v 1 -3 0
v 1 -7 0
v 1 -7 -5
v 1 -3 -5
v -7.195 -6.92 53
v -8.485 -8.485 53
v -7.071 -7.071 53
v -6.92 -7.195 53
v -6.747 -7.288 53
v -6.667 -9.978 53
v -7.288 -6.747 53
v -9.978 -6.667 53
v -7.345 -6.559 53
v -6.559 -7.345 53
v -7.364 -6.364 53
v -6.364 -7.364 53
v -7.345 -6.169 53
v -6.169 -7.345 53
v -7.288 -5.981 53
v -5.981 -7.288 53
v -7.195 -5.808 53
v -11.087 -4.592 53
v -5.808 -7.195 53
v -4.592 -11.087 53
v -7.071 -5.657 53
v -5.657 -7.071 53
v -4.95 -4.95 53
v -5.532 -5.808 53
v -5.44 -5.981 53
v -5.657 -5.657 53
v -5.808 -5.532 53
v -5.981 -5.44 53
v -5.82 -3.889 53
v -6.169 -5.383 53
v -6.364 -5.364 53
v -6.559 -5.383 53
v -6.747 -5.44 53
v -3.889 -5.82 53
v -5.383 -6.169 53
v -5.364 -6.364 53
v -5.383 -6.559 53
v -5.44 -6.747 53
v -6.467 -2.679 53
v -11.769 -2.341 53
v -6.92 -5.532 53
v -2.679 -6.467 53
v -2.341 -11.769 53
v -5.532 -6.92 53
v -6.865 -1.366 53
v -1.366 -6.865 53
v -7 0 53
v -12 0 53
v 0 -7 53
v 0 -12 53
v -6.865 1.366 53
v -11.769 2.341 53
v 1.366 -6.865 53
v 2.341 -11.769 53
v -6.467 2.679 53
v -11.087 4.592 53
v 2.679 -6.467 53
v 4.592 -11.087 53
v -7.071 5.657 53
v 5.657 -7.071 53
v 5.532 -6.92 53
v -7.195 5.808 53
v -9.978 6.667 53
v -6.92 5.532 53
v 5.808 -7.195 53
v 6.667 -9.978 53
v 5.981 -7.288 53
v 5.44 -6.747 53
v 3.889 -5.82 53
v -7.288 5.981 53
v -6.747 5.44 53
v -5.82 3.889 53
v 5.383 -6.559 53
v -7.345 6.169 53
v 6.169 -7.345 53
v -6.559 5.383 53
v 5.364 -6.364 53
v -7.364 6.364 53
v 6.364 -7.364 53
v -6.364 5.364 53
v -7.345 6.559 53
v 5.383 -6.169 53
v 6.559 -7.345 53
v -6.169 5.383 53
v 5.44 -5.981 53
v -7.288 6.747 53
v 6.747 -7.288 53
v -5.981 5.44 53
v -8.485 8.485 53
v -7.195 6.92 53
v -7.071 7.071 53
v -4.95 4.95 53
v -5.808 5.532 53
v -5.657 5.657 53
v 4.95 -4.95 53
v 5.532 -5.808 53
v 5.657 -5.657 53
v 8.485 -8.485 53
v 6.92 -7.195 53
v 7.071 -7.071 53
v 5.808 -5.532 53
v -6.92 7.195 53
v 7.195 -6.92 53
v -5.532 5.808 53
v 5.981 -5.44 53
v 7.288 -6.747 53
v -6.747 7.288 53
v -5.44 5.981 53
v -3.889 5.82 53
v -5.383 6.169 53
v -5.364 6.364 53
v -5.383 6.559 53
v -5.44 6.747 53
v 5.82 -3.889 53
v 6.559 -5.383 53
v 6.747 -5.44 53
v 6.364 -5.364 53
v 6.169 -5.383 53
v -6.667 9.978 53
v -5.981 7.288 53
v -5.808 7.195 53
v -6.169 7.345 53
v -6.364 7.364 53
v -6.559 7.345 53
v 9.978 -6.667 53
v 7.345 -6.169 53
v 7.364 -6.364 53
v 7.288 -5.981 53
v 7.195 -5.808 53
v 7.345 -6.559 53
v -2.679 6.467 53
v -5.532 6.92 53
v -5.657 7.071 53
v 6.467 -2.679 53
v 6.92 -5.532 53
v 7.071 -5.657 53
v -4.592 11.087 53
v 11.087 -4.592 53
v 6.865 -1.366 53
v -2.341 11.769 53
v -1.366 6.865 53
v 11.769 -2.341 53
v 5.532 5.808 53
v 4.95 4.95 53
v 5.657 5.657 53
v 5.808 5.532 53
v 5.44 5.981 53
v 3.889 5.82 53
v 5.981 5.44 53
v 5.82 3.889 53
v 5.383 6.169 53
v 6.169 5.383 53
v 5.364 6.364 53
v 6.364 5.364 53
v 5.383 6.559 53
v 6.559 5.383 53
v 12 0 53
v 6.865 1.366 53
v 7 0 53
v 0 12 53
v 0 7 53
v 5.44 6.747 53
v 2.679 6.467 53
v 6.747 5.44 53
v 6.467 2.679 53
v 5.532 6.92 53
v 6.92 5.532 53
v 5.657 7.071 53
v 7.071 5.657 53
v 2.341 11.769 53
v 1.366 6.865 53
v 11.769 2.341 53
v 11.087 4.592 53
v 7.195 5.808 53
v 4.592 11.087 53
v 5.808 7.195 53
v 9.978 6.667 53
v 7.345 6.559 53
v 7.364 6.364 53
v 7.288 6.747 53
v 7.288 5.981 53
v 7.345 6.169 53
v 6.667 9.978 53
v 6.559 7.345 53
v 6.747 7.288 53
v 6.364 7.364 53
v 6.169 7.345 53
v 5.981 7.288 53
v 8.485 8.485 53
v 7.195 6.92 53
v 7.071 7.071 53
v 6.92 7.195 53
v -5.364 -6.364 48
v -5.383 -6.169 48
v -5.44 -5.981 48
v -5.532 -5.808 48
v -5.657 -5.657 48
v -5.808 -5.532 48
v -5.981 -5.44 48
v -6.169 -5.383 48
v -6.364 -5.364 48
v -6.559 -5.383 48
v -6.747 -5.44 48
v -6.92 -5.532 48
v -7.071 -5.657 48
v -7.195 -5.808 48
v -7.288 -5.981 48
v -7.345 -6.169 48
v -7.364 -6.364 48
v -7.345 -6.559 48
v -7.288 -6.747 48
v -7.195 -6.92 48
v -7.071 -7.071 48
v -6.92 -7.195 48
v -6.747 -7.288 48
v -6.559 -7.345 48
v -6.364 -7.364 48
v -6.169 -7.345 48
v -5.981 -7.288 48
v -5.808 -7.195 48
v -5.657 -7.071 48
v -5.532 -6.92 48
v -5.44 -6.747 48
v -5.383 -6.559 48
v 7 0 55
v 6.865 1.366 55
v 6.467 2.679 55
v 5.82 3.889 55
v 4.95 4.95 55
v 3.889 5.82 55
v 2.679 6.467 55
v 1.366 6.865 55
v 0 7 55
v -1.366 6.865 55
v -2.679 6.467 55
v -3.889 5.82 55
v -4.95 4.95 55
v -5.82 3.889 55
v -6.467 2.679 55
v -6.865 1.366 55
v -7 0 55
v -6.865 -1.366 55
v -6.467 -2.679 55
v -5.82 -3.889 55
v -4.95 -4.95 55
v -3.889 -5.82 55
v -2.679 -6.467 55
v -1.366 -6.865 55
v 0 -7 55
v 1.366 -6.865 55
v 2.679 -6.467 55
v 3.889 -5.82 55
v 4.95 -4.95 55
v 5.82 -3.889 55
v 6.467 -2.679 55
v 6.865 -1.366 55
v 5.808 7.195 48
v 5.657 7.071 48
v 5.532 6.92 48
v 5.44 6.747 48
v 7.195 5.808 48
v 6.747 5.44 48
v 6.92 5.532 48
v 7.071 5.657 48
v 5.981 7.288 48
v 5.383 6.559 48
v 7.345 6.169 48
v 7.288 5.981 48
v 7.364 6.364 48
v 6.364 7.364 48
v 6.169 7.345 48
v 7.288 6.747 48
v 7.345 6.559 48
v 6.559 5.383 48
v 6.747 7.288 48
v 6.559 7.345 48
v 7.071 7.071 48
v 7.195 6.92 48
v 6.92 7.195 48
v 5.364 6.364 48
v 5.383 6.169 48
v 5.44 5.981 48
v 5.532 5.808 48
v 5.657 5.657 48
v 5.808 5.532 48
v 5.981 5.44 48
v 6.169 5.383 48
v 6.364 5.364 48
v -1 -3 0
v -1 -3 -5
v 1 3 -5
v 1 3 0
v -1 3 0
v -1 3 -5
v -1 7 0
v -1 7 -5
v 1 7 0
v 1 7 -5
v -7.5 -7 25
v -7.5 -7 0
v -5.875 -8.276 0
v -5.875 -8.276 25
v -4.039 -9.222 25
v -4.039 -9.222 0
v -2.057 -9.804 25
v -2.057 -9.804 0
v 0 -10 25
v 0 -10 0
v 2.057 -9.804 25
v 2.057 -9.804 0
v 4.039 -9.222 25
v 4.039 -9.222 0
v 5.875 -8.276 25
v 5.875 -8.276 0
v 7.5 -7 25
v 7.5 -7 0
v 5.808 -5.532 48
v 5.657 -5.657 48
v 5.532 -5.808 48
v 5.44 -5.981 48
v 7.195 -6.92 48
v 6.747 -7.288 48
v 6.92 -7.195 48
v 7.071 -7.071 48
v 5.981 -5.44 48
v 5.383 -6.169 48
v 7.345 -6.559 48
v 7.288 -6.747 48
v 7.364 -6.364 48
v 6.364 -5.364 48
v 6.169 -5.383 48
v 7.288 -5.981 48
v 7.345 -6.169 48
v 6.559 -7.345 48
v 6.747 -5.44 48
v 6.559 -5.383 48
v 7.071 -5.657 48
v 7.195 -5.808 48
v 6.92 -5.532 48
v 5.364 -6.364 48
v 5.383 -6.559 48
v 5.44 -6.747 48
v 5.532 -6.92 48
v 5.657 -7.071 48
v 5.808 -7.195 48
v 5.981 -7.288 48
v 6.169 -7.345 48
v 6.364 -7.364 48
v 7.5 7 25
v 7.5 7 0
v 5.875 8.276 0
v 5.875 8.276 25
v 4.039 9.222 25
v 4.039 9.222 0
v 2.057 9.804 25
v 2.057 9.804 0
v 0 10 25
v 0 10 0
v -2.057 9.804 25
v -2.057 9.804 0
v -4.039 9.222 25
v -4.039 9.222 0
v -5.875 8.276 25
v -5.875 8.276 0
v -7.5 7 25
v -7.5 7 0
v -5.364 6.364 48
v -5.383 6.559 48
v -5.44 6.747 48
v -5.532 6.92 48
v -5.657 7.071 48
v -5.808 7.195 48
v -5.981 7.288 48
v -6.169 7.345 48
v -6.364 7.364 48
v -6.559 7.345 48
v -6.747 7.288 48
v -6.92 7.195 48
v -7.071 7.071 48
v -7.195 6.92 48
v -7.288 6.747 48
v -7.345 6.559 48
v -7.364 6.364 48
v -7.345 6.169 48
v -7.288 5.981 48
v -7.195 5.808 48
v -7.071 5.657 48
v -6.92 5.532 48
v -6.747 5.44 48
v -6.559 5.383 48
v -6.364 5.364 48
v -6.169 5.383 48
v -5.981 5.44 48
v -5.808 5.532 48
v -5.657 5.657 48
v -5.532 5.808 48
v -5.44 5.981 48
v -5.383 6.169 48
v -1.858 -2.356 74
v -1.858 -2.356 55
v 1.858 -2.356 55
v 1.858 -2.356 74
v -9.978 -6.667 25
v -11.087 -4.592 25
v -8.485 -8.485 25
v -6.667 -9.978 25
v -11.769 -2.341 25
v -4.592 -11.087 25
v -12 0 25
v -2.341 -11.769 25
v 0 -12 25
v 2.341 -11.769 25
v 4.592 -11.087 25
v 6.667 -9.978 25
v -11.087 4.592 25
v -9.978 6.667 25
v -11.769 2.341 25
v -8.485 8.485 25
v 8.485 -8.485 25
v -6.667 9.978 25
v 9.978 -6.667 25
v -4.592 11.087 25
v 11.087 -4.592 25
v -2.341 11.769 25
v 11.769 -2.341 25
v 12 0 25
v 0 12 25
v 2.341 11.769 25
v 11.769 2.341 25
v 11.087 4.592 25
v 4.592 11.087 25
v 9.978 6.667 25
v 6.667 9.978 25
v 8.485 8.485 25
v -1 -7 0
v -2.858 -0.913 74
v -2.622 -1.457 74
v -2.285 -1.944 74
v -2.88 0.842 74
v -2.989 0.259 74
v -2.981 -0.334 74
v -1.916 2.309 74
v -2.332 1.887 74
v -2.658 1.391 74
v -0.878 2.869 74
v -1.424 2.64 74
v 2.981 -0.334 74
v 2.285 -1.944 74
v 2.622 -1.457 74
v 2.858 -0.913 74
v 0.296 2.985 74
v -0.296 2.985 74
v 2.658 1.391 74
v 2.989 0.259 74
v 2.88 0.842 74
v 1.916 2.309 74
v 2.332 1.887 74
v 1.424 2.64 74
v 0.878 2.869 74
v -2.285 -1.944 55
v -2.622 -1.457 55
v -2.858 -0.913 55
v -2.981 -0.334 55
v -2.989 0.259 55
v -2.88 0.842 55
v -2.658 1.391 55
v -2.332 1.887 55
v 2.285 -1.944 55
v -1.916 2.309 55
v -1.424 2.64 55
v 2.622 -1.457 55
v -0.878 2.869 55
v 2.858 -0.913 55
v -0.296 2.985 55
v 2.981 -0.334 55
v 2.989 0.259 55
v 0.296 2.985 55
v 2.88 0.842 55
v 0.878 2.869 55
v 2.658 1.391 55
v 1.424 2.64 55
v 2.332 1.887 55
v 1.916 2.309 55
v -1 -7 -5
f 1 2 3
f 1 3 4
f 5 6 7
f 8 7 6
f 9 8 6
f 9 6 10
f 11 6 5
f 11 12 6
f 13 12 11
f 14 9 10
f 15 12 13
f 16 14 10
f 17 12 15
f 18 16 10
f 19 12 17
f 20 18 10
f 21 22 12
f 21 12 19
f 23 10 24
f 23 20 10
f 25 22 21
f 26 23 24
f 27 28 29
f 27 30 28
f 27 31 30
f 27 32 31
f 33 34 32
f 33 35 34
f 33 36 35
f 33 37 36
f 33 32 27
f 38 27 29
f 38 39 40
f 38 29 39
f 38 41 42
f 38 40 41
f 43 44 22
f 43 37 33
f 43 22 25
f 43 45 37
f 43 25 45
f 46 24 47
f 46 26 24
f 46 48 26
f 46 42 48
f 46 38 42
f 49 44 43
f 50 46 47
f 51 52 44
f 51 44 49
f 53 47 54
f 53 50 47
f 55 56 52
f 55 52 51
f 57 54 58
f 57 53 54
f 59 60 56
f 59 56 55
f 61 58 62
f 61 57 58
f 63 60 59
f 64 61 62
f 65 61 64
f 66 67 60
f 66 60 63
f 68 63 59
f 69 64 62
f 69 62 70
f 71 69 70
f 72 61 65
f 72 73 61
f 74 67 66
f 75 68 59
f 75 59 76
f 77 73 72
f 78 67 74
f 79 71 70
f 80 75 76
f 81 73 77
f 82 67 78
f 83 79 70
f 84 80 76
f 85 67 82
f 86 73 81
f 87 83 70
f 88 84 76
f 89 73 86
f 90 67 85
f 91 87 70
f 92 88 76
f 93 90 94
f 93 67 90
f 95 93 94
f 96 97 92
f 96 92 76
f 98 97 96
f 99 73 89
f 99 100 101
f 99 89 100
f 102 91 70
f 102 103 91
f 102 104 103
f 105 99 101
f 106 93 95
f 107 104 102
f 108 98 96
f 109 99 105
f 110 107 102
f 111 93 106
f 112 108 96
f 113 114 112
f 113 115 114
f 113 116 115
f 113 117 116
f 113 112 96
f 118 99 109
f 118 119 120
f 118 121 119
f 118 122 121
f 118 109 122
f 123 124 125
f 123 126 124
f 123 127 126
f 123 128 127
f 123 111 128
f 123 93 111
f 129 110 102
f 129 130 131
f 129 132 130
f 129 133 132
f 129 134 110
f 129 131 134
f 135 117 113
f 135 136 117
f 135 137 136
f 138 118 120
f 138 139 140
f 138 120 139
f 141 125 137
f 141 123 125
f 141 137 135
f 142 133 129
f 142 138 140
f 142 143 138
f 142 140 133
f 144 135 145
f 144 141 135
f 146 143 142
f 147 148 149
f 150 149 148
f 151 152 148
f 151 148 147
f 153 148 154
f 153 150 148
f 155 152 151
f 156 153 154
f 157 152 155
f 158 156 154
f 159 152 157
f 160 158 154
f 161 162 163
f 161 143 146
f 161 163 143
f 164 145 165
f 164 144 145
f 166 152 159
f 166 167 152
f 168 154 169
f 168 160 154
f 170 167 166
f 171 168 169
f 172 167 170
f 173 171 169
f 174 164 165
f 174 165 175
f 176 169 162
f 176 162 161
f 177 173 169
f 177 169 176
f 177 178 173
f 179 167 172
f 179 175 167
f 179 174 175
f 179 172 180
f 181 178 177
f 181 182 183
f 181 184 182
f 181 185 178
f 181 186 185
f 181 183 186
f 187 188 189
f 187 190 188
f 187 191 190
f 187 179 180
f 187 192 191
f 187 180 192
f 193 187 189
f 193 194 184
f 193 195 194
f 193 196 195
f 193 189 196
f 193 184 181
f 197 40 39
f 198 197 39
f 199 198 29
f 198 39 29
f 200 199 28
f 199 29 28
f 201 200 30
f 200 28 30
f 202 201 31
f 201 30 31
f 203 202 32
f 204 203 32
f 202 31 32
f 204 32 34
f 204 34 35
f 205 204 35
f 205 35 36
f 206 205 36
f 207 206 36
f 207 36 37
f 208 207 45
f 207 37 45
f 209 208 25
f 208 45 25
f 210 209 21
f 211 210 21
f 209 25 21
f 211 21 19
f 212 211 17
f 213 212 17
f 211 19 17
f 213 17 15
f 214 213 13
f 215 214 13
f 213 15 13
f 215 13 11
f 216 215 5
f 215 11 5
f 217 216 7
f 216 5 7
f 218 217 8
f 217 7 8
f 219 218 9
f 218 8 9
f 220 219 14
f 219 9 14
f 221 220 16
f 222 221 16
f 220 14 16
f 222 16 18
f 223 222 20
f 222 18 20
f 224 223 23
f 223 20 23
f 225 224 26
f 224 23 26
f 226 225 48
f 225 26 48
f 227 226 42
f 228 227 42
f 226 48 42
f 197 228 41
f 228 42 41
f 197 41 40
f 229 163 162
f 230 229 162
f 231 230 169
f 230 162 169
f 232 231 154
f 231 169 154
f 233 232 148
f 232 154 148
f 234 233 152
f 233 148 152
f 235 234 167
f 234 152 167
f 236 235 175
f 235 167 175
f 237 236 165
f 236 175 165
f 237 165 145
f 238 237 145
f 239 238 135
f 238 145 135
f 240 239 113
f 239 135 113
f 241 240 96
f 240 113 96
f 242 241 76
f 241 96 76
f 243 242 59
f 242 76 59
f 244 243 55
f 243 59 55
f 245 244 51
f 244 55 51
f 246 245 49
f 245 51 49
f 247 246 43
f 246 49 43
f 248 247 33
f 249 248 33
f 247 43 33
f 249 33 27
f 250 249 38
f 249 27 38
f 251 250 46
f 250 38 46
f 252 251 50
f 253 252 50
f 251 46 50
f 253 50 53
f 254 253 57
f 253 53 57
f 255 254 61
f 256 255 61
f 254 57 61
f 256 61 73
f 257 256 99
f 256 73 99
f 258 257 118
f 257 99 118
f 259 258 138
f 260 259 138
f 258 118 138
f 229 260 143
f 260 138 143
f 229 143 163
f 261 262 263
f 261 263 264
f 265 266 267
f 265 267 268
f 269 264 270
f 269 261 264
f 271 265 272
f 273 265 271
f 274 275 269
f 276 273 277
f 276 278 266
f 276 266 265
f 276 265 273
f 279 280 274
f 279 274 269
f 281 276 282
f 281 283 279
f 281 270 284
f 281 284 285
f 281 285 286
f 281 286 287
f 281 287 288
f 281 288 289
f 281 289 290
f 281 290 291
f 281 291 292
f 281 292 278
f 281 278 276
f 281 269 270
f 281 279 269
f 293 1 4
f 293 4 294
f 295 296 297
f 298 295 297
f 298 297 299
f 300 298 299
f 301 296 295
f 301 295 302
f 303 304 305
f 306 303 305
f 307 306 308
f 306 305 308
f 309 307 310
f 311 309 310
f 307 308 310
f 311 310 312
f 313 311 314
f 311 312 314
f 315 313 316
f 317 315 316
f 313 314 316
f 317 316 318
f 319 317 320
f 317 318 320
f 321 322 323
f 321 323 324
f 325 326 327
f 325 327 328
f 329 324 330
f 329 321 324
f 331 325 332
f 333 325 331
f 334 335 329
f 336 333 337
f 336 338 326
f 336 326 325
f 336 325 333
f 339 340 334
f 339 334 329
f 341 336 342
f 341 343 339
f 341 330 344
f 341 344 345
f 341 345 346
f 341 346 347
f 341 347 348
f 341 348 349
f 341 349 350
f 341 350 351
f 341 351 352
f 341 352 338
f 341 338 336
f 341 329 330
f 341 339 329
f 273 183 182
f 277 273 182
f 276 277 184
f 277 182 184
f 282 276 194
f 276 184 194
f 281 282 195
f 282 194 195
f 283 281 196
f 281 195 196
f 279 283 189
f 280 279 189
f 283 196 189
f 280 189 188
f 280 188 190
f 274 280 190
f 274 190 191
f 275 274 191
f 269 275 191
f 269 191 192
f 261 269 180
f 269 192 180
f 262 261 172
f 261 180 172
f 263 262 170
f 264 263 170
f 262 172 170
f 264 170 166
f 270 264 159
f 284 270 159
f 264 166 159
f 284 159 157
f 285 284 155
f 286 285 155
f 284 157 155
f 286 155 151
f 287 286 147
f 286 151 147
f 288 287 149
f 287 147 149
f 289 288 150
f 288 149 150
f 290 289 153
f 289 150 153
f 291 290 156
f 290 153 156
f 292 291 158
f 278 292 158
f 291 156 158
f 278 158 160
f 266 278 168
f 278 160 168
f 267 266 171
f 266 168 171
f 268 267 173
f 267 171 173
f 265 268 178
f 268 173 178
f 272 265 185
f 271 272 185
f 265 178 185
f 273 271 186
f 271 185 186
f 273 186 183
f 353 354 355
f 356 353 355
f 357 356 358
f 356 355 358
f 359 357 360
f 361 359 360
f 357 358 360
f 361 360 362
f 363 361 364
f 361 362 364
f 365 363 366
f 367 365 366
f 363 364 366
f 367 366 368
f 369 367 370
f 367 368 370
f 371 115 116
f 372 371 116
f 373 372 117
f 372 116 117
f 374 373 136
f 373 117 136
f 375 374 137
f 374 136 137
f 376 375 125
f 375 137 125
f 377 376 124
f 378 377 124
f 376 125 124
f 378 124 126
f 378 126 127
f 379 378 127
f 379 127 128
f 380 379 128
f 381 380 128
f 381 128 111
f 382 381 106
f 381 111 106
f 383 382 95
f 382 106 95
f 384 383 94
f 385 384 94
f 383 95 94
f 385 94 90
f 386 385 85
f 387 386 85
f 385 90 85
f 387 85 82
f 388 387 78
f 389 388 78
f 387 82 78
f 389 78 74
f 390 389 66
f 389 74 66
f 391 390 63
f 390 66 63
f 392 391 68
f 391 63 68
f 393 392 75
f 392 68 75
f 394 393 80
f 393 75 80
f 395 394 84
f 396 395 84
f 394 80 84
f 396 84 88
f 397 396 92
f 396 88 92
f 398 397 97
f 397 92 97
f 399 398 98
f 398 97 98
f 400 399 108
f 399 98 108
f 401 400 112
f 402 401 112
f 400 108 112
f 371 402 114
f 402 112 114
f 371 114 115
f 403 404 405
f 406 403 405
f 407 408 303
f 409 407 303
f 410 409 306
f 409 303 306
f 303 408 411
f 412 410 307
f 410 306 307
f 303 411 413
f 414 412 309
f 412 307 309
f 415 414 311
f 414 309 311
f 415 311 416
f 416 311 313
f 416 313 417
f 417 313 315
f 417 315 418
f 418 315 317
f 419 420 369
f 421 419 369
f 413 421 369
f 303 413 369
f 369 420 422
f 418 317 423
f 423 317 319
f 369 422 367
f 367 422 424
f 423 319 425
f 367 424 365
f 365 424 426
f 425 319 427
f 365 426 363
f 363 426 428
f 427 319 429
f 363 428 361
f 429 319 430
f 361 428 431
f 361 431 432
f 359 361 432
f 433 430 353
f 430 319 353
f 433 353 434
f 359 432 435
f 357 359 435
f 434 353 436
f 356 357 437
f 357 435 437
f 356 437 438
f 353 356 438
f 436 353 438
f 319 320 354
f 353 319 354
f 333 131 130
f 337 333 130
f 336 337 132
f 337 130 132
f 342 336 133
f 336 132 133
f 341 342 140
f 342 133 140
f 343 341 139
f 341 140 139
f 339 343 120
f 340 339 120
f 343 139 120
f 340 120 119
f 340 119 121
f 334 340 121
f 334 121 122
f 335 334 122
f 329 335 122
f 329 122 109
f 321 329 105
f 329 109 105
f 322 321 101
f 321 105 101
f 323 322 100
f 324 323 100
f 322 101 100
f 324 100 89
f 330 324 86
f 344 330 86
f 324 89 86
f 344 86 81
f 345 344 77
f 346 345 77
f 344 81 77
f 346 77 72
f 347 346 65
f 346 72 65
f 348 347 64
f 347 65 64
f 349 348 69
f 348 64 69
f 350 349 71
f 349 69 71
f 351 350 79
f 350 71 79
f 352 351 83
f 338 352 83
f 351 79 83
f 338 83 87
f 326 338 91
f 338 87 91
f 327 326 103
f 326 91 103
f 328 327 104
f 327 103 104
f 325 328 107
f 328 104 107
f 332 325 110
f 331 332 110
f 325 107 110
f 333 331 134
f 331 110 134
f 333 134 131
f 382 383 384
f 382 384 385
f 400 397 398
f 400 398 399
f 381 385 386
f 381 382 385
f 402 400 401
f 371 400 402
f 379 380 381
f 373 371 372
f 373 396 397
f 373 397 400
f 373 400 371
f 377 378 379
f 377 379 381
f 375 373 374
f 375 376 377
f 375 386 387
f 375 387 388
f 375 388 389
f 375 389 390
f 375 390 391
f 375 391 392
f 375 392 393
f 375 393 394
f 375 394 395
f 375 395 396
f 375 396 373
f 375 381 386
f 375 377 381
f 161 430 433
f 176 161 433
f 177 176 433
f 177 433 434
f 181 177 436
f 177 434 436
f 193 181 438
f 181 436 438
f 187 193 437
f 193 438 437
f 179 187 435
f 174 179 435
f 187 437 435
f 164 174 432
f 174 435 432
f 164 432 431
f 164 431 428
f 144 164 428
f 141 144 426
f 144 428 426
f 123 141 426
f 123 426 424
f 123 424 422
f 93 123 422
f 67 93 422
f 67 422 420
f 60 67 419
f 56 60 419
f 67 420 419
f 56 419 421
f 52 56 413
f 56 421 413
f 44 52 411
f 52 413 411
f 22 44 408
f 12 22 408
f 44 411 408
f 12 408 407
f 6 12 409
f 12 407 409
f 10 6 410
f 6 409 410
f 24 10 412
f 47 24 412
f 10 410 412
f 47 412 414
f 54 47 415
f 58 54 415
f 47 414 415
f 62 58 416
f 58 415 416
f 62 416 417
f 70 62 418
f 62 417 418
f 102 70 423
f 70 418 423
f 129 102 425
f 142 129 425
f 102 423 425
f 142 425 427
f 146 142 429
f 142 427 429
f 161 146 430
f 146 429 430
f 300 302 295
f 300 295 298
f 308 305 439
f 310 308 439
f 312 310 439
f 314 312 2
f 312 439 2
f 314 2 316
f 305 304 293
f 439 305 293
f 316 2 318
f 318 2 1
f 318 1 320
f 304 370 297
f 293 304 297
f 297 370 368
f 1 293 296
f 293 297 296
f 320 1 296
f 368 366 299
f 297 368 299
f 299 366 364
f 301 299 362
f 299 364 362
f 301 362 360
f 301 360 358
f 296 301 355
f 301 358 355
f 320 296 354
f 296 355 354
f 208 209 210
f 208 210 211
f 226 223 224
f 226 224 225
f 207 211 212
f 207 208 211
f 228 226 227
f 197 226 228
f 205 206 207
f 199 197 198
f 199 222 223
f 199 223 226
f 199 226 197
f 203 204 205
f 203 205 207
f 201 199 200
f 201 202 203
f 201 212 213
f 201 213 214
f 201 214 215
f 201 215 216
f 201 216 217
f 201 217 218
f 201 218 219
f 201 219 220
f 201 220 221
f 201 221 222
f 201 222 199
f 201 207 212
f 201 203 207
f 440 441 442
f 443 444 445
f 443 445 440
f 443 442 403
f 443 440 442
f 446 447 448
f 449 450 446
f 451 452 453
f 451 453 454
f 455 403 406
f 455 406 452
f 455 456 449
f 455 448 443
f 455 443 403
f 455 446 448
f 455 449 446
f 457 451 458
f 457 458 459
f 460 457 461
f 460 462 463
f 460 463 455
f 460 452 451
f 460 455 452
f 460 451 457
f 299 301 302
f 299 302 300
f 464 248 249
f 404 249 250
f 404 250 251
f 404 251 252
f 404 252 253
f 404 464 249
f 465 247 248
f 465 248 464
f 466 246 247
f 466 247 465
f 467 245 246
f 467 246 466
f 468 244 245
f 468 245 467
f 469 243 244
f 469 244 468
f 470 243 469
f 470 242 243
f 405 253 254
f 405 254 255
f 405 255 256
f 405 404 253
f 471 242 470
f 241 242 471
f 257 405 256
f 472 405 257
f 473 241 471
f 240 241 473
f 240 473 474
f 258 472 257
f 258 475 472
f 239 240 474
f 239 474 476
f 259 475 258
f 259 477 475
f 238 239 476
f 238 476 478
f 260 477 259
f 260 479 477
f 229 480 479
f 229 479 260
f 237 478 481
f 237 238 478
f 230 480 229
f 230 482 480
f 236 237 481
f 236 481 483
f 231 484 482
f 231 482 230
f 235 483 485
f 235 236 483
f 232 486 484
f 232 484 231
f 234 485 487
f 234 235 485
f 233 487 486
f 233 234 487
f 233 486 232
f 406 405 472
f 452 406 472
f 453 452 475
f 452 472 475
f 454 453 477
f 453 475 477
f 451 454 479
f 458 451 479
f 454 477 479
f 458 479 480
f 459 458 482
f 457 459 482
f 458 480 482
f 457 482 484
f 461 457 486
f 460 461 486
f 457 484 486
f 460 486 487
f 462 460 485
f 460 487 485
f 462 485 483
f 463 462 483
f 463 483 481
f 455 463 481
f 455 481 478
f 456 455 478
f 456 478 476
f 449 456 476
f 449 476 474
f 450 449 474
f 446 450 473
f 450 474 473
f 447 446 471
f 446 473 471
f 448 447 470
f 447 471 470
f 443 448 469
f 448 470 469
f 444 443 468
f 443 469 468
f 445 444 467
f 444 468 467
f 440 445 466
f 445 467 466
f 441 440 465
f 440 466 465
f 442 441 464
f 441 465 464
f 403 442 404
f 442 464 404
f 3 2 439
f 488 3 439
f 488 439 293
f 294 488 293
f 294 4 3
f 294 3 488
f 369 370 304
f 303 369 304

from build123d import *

# Parameters (mm, degrees)
BOSS_EXTRUDE1_DEPTH = 25
SKETCH2_W           = 2
SKETCH2_H           = 4
BOSS_EXTRUDE2_DEPTH = 5
SKETCH3_R           = 12
BOSS_EXTRUDE3_DEPTH = 28
SKETCH4_R           = 7
BOSS_EXTRUDE4_DEPTH = 2
SKETCH5_R           = 1
CUT_EXTRUDE1_DEPTH  = 5
BOSS_EXTRUDE5_DEPTH = 19


with BuildPart() as part:
    # Sketch1 → Boss-Extrude1 (new body)
    with BuildSketch(Plane.XY):
        with BuildLine():
            Line((7.5, -7), (7.5, 7))
            ThreePointArc((7.5, 7), (0, 10), (-7.5, 7))
            Line((-7.5, 7), (-7.5, -7))
            ThreePointArc((-7.5, -7), (0, -10), (7.5, -7))
        make_face()
    extrude(amount=BOSS_EXTRUDE1_DEPTH)

    # Sketch2 → Boss-Extrude2 (add)
    with BuildSketch(Plane(origin=(0, 0, 0), x_dir=(-1, 0, 0), z_dir=(0, 0, -1))):
        with Locations((0, 5)):
            Rectangle(SKETCH2_W, SKETCH2_H)
        with Locations((0, -5)):
            Rectangle(SKETCH2_W, SKETCH2_H)
    extrude(amount=BOSS_EXTRUDE2_DEPTH)

    # Sketch3 → Boss-Extrude3 (add)
    with BuildSketch(Plane.XY.offset(25)):
        Circle(SKETCH3_R)
    extrude(amount=BOSS_EXTRUDE3_DEPTH)

    # Sketch4 → Boss-Extrude4 (add)
    with BuildSketch(Plane.XY.offset(53)):
        Circle(SKETCH4_R)
    extrude(amount=BOSS_EXTRUDE4_DEPTH)

    # Sketch5 → Cut-Extrude1 (cut)
    with BuildSketch(Plane.XY.offset(53)):
        with Locations((-6.363961031, 6.363961031)):
            Circle(SKETCH5_R)
        with Locations((6.363961031, 6.363961031)):
            Circle(SKETCH5_R)
        with Locations((6.363961031, -6.363961031)):
            Circle(SKETCH5_R)
        with Locations((-6.363961031, -6.363961031)):
            Circle(SKETCH5_R)
    extrude(amount=-CUT_EXTRUDE1_DEPTH, mode=Mode.SUBTRACT)

    # Sketch6 → Boss-Extrude5 (add)
    with BuildSketch(Plane.XY.offset(55)):
        with BuildLine():
            Line((-1.857593316, -2.355705218), (1.857593316, -2.355705218))
            ThreePointArc((1.857593316, -2.355705218), (0, 3), (-1.857593316, -2.355705218))
        make_face()
    extrude(amount=BOSS_EXTRUDE5_DEPTH)


solid = part.part
